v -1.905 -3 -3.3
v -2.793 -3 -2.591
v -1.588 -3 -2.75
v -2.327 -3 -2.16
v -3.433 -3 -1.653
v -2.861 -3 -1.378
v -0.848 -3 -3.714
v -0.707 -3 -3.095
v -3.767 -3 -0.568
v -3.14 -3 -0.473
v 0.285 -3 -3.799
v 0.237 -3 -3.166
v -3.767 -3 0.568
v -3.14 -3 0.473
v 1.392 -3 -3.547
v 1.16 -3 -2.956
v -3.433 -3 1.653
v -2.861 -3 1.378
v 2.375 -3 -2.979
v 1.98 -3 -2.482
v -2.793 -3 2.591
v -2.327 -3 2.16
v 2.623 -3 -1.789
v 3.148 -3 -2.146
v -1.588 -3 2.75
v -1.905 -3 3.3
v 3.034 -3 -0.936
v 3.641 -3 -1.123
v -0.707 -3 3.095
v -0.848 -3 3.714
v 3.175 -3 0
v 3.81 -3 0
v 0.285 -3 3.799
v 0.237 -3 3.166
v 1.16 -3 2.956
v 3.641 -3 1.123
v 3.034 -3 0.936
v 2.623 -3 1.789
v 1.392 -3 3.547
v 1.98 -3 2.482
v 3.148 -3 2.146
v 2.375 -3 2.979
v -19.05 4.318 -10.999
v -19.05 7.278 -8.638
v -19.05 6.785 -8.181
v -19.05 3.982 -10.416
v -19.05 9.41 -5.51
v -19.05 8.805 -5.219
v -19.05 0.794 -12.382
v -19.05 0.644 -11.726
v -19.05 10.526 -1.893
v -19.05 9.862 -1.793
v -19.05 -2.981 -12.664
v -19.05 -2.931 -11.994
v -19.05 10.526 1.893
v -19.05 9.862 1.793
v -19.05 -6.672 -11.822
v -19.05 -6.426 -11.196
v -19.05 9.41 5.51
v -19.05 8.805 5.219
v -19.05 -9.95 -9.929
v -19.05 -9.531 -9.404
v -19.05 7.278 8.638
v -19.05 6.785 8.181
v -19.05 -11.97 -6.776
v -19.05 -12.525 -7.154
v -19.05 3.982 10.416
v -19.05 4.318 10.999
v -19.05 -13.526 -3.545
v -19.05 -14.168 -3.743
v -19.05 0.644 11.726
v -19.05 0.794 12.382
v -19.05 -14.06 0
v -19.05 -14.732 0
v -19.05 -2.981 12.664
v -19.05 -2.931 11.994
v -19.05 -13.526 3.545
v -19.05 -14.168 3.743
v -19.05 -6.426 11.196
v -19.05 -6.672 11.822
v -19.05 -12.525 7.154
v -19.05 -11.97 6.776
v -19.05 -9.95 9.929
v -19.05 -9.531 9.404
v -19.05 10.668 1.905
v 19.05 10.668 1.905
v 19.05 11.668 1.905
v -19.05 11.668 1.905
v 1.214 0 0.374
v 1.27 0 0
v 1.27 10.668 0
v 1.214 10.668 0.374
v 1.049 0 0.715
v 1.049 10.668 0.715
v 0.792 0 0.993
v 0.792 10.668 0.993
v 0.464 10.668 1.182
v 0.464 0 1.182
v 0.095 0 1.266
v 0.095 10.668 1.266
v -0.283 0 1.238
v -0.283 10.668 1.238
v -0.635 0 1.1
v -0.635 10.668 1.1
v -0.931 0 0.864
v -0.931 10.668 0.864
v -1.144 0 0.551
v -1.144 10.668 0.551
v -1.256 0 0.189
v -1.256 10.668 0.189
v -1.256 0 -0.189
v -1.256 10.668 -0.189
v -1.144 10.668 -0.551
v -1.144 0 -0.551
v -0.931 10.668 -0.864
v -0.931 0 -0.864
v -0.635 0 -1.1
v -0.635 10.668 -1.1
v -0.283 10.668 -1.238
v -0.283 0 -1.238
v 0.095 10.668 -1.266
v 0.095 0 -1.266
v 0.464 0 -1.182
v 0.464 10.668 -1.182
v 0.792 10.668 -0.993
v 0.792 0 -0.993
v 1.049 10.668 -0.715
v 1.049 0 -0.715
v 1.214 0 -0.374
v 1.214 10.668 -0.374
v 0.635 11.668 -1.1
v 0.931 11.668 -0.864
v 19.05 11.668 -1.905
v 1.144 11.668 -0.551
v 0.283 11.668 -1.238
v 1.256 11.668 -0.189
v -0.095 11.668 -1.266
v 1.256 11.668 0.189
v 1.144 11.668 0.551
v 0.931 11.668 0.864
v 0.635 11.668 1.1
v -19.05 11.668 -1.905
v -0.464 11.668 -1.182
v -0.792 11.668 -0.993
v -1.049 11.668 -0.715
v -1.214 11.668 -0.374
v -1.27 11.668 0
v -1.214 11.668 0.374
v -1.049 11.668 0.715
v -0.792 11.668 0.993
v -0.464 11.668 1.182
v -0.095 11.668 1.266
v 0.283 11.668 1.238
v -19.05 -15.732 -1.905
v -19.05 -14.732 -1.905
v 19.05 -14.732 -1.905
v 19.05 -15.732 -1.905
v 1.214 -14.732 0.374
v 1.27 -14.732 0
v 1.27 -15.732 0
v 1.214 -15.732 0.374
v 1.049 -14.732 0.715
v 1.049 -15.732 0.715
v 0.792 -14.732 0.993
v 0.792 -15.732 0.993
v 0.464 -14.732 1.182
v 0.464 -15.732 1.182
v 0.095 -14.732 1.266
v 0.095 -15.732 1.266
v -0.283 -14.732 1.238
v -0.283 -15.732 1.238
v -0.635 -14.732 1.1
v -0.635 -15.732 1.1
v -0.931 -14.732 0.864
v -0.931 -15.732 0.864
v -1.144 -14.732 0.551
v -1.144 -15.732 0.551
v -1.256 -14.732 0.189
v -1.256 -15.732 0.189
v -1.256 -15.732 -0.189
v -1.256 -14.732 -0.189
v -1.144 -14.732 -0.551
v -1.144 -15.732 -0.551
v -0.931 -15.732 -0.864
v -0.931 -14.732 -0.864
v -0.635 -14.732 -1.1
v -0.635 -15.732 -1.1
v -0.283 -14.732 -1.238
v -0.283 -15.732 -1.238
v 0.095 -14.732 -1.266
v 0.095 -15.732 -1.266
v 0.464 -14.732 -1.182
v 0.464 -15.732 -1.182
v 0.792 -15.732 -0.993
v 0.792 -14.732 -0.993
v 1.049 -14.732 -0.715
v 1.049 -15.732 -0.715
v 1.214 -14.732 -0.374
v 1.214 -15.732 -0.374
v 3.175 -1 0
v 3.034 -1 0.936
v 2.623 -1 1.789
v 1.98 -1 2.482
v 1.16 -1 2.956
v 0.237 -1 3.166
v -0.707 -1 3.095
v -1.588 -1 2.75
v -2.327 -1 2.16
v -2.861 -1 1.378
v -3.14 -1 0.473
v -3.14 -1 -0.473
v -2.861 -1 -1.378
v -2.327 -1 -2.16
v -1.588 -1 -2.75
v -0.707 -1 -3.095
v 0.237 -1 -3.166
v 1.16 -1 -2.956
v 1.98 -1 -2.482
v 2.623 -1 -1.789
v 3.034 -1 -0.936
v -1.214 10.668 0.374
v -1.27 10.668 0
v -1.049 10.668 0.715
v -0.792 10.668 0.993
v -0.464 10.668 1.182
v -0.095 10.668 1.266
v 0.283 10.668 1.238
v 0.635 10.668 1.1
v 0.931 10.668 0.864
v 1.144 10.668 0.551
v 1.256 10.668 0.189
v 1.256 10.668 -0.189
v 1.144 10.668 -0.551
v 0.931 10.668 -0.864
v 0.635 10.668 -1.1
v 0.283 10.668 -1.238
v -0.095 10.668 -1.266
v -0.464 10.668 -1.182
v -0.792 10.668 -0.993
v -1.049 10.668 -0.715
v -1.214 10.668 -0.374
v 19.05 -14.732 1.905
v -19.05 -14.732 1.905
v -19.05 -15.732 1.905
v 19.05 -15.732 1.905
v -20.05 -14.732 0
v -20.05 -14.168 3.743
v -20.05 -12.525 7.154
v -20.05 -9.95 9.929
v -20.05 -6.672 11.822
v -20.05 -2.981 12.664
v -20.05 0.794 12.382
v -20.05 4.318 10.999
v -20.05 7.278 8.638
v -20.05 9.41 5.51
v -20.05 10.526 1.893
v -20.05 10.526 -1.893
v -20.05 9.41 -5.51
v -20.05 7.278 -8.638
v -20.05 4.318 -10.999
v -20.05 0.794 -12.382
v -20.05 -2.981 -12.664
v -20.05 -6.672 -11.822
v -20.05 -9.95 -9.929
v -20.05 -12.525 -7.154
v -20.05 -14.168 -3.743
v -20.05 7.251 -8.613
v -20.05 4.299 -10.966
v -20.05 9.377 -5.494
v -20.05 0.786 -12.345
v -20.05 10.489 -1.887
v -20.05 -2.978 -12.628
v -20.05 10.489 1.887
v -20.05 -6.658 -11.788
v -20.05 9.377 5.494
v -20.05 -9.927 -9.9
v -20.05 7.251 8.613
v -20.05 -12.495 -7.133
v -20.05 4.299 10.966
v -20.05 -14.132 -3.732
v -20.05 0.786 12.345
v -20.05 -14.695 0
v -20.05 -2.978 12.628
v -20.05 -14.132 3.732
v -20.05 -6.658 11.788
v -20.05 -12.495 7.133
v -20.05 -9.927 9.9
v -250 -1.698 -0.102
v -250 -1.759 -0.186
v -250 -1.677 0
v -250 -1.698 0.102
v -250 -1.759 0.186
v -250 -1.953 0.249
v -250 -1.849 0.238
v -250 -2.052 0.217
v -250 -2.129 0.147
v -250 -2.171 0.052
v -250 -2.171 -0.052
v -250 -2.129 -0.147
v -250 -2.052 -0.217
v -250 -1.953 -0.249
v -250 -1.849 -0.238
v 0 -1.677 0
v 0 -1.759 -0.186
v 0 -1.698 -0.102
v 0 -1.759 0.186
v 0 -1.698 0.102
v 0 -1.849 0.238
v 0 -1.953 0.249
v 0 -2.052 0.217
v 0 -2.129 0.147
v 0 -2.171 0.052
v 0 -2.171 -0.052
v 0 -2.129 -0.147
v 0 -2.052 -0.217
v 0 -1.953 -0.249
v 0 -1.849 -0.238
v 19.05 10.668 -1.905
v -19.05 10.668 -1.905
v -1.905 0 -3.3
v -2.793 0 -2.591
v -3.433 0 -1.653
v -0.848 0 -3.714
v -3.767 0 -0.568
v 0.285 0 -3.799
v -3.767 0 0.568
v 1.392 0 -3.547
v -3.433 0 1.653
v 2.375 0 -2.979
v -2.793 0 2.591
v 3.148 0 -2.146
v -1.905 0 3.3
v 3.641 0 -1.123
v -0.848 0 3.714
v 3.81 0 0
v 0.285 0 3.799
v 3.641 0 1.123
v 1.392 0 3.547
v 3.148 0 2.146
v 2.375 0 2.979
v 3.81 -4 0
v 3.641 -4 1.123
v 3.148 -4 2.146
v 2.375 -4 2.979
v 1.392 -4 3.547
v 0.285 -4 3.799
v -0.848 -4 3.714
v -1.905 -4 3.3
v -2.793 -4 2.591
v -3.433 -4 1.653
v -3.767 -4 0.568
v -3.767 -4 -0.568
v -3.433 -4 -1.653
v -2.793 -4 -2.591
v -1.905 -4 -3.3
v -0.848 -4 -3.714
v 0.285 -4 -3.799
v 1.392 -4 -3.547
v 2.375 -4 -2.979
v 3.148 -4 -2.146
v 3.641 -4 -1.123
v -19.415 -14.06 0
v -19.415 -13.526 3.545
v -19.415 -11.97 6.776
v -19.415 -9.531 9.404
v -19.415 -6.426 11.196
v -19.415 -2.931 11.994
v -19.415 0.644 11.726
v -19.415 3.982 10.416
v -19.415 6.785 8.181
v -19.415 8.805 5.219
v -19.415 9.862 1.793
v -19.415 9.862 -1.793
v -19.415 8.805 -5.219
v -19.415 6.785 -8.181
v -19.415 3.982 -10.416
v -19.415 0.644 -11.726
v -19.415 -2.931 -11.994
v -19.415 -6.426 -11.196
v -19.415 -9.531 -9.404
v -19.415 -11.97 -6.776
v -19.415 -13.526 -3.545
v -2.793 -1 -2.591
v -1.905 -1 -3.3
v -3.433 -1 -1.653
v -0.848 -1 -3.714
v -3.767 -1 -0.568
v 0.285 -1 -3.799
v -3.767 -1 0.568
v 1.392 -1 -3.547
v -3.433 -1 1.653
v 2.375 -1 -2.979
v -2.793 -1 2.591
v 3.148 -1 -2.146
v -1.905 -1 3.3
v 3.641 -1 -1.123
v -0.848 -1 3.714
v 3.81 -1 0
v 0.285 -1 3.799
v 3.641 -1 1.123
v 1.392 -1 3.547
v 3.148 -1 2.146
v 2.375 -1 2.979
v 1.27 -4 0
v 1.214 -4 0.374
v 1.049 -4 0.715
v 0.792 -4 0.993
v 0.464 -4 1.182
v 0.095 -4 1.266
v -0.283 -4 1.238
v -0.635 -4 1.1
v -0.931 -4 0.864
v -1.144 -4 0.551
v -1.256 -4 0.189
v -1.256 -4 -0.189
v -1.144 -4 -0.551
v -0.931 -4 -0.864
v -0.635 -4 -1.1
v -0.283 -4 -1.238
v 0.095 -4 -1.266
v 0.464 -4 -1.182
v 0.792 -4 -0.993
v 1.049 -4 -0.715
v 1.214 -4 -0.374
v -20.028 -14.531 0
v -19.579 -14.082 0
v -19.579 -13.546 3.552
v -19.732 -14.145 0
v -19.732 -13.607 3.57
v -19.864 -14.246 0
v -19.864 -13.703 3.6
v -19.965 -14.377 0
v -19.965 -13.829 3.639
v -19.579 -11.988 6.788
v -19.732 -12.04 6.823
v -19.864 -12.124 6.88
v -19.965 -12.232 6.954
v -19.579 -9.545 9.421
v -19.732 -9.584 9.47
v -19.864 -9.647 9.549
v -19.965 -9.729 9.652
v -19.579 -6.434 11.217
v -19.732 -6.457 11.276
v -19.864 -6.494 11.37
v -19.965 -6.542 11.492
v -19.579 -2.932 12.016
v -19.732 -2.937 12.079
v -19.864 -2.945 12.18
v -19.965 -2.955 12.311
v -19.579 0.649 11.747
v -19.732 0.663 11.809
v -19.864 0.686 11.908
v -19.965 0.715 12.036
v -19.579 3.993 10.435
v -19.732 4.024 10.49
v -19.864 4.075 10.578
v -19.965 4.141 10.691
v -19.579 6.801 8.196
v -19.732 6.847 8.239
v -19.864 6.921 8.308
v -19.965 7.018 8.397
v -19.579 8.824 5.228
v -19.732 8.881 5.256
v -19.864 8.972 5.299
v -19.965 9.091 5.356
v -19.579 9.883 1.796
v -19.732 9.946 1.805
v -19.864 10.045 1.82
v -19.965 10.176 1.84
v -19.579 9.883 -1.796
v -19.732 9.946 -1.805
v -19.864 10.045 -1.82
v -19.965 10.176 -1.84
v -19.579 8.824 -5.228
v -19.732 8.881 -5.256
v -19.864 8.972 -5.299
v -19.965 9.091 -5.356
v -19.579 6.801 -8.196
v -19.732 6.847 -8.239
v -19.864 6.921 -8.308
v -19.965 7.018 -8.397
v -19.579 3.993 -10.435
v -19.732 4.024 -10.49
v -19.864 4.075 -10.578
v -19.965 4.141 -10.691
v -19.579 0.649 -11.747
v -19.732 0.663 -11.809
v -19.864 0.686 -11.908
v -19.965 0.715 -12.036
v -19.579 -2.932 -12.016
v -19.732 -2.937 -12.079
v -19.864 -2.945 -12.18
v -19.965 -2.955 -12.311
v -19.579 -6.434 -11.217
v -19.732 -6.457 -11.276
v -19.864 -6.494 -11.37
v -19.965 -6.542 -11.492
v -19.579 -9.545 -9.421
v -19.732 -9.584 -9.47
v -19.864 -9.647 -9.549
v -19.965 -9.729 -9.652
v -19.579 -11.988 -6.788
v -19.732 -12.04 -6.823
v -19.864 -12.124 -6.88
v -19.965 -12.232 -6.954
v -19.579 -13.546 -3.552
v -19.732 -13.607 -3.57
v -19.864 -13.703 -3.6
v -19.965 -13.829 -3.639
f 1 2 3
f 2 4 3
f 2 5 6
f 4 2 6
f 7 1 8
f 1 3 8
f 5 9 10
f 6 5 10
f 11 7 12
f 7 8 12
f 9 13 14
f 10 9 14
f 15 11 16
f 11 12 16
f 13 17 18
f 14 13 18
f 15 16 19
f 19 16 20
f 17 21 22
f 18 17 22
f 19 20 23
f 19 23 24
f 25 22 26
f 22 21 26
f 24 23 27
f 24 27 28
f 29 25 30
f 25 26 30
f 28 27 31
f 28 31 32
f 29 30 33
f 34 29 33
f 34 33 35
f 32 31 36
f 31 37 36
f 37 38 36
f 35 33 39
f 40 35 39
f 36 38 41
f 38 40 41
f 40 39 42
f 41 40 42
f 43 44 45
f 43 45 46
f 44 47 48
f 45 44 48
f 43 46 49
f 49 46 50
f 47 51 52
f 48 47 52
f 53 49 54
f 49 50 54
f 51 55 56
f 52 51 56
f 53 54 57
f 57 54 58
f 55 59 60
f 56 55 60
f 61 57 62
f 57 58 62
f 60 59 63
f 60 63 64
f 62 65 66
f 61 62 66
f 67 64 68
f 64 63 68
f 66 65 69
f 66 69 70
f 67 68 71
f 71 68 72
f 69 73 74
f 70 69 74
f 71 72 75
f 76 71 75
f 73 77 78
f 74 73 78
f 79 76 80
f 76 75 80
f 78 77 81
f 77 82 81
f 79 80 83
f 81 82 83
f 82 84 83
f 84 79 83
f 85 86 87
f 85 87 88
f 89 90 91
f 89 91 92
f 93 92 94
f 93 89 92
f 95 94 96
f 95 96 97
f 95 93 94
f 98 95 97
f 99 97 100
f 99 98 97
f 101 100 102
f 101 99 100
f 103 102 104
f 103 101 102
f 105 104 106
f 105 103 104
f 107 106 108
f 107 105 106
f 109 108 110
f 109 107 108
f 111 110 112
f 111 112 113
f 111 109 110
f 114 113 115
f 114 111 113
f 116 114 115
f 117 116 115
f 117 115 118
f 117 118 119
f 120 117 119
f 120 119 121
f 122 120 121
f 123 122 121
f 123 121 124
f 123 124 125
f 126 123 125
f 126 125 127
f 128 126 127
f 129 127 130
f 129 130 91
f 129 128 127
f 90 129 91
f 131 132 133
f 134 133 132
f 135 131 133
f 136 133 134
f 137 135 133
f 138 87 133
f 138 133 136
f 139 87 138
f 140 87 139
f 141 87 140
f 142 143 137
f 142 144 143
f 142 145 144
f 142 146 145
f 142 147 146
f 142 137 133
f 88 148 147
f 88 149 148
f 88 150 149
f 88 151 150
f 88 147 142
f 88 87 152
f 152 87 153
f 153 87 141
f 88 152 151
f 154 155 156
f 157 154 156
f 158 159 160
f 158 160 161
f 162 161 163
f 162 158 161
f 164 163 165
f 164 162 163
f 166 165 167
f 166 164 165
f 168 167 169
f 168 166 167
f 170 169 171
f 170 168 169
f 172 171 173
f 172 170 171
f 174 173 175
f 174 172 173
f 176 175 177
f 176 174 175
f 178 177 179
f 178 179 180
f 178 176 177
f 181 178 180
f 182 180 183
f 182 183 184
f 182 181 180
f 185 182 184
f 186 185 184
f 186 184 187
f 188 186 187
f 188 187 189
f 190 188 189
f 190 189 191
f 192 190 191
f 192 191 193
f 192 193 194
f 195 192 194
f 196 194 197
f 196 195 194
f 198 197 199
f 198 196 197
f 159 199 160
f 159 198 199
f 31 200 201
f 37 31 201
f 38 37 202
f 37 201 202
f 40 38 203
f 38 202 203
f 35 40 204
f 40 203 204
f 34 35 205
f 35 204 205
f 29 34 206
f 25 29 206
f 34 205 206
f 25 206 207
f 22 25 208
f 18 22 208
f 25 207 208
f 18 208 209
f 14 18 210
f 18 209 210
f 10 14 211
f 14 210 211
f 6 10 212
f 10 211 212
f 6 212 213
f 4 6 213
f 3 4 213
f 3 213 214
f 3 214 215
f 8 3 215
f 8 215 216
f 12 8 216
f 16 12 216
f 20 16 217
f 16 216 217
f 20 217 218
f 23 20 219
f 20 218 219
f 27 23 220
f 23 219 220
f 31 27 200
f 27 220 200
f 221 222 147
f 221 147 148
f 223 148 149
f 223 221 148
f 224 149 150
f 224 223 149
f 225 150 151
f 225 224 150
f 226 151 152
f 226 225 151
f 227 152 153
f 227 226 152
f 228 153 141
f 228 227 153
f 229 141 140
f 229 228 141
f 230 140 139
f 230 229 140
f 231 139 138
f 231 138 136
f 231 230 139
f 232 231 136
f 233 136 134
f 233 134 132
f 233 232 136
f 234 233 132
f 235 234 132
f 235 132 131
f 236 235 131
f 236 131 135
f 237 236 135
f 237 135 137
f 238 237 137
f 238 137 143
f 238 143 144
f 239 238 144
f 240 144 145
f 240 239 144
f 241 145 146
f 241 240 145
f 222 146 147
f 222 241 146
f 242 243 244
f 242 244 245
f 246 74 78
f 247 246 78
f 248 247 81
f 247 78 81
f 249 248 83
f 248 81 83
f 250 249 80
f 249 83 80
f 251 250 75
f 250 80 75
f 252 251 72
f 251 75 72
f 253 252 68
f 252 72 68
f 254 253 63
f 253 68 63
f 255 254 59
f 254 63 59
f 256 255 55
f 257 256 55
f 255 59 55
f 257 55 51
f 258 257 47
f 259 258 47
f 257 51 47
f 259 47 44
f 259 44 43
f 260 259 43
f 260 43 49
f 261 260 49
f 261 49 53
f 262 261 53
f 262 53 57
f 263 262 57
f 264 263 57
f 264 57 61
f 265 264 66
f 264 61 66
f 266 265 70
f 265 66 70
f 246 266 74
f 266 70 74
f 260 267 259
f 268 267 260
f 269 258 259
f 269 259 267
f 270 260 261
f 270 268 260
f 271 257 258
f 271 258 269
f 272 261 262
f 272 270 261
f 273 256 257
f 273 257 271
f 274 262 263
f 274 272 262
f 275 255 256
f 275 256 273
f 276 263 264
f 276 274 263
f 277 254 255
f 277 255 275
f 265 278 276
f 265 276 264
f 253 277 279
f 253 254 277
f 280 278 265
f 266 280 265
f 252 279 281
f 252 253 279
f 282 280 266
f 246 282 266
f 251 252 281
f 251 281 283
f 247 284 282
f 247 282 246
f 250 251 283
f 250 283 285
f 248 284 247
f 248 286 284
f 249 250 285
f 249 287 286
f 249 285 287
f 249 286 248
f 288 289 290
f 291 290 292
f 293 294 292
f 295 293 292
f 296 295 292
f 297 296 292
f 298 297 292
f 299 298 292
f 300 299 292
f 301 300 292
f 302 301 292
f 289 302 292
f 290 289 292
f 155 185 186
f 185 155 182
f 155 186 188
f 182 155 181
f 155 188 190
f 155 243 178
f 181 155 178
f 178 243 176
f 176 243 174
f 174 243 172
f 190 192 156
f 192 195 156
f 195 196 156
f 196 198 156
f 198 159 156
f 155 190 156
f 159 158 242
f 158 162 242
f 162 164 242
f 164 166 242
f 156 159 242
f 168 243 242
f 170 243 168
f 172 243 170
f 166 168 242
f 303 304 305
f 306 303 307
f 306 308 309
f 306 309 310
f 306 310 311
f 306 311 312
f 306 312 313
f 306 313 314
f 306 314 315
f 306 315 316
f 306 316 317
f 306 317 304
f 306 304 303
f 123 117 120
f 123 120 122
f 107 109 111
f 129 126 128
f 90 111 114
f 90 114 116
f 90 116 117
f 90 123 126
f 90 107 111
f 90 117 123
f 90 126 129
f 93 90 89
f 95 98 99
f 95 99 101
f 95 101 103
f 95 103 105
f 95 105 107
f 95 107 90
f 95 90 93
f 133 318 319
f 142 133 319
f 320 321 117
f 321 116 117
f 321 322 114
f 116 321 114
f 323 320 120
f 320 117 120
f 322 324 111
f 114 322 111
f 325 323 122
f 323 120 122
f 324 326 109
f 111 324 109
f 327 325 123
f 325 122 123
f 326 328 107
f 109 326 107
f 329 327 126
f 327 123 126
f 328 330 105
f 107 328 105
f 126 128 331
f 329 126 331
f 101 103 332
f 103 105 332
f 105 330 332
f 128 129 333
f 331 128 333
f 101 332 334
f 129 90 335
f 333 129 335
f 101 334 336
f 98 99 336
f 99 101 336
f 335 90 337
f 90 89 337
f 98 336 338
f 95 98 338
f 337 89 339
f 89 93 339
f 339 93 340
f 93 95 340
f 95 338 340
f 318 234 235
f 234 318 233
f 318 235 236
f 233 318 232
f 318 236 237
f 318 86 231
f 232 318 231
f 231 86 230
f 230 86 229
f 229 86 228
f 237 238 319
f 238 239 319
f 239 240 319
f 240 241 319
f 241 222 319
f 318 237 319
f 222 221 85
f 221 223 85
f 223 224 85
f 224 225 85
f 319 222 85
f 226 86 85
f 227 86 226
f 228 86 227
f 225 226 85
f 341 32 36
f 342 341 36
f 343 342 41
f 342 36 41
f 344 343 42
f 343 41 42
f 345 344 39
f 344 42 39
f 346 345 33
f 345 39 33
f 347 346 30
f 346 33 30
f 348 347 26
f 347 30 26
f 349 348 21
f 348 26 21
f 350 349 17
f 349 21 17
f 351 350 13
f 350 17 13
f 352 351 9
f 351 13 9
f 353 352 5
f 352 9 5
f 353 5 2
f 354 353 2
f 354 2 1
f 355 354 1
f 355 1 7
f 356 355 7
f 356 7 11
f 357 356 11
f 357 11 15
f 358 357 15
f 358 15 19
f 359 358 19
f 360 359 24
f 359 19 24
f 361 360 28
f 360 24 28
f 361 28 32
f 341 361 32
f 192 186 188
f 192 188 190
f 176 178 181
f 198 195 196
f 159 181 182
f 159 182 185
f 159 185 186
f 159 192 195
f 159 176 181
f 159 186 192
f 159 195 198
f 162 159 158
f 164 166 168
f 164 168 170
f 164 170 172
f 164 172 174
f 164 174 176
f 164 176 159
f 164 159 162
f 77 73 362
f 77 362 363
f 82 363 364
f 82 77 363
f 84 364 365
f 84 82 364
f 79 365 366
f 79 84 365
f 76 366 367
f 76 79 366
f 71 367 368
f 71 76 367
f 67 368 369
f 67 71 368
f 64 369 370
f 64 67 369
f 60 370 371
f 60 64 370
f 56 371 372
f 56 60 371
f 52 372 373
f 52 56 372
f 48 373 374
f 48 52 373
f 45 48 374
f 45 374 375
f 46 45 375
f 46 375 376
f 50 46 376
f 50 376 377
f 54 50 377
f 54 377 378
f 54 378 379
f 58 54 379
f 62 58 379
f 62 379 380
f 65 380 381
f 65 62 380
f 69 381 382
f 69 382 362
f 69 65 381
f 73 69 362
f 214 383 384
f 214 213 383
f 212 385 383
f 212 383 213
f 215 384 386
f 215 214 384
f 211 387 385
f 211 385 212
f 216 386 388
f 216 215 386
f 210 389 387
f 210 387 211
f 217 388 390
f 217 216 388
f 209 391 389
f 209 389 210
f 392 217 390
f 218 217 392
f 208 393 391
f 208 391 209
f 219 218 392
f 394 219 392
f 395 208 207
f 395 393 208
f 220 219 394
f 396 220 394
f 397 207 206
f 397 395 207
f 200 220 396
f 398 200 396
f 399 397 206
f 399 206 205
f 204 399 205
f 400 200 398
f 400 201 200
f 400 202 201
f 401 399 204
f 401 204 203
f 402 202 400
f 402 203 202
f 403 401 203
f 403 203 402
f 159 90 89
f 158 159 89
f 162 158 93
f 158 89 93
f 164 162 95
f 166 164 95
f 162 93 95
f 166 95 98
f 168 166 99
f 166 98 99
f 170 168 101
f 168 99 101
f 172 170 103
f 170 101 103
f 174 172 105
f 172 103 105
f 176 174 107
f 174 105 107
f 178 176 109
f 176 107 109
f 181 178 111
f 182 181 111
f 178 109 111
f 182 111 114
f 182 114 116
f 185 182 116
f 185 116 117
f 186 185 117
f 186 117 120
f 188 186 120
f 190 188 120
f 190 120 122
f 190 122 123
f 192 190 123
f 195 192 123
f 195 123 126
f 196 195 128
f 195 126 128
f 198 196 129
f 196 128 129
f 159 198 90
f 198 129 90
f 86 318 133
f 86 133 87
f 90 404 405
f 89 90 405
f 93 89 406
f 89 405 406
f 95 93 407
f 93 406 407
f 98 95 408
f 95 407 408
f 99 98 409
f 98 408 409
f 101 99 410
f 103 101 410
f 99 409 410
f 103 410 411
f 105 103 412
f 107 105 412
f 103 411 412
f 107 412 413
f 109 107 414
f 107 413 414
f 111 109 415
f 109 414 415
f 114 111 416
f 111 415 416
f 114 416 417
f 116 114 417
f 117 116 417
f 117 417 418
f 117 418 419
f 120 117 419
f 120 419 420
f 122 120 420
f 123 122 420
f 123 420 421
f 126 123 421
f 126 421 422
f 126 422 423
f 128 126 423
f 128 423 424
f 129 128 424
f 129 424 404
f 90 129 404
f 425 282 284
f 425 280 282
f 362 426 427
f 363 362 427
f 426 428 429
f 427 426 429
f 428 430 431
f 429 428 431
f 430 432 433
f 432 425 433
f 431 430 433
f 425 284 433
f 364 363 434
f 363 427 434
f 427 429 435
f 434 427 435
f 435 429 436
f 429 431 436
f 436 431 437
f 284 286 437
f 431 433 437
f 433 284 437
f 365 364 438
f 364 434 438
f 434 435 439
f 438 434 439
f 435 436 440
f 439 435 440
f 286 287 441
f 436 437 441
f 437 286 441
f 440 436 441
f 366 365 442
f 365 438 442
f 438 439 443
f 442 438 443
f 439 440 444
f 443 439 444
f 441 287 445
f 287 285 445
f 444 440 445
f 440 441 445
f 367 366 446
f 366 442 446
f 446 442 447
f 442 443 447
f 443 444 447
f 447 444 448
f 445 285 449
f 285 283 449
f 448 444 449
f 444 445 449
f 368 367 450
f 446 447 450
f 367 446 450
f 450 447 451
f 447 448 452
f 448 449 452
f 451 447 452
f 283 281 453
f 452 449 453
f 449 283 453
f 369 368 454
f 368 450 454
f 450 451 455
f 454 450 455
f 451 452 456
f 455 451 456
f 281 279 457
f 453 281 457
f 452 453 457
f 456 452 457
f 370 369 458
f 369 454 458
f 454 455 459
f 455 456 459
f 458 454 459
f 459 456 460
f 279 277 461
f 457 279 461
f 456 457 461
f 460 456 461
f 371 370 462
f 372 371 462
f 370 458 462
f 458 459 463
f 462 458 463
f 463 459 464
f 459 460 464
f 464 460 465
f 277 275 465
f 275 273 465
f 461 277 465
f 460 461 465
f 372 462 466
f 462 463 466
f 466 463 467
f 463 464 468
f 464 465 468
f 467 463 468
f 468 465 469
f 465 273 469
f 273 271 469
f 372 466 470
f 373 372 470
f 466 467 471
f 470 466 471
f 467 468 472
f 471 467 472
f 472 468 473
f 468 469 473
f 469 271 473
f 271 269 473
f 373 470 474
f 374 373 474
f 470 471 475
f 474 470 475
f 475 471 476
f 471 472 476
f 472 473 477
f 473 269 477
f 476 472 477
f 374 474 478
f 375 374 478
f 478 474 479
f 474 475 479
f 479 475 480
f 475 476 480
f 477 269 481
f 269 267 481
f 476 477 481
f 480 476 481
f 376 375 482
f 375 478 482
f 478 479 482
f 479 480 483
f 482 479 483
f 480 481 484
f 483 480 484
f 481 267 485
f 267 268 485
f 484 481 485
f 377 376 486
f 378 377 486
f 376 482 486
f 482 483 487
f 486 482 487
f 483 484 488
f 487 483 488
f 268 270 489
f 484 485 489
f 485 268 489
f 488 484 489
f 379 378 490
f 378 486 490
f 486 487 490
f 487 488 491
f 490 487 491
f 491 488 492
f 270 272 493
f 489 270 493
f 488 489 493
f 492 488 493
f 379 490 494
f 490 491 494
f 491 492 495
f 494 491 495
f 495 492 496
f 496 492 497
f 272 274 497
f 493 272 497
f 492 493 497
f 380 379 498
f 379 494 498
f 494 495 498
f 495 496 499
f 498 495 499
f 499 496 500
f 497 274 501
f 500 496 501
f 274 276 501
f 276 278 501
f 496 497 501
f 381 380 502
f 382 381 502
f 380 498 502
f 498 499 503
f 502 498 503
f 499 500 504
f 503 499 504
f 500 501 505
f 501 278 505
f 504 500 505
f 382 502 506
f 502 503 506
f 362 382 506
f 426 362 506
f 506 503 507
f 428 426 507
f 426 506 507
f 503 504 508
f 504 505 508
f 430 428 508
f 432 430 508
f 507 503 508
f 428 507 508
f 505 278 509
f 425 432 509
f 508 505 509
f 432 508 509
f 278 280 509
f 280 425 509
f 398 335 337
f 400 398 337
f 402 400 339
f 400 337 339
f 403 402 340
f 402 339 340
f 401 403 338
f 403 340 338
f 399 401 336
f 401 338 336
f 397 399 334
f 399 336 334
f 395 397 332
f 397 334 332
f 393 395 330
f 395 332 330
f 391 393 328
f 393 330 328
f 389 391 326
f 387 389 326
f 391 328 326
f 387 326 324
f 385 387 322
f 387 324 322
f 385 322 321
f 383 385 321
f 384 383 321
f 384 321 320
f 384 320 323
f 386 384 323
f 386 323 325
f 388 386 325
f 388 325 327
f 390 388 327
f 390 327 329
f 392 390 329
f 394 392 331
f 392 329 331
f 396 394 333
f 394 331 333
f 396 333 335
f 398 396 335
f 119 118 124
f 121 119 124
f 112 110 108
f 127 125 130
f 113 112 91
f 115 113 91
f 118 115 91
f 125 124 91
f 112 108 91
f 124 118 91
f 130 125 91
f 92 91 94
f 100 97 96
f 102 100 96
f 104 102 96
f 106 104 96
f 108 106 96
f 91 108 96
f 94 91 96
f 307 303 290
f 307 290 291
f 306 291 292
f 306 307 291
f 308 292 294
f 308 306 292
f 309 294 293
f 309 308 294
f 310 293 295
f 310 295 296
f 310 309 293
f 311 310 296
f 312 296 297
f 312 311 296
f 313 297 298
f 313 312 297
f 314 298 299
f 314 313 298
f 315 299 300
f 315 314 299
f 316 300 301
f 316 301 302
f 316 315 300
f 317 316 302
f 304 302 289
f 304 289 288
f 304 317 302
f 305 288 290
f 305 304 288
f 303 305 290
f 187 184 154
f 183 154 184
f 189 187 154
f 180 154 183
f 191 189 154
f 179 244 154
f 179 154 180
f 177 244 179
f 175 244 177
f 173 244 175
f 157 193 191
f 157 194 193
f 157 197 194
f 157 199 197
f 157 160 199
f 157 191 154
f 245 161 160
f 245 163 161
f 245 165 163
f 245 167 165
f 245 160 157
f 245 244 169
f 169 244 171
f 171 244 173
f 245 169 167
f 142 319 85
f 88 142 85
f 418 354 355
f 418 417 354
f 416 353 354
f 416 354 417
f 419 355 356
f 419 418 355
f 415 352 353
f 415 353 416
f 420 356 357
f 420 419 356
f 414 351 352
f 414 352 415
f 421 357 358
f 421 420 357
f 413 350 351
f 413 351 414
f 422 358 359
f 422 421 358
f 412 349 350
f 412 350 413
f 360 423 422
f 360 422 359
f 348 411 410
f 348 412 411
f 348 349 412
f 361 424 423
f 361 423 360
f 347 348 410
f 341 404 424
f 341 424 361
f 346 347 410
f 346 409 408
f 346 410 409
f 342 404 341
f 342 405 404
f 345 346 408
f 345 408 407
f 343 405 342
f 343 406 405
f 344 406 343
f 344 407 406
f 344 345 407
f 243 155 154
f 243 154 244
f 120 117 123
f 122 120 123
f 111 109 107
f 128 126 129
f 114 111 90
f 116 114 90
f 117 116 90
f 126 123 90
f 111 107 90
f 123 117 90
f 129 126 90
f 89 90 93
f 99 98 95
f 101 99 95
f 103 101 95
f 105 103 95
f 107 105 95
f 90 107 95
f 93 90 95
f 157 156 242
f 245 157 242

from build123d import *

# Parameters (mm, degrees)
F0_R      = 3.81
F0_R_2    = 3.175
F1_DEPTH  = 1
F2_R      = 3.175
F3_DEPTH  = 2
F4_R      = 3.81
F4_R_2    = 3.175
F5_DEPTH  = 1
F6_R      = 1.27
F7_DEPTH  = 25.4
F8_R      = 1.27
F9_DEPTH  = 10.668
F10_DEPTH = 14.732
F11_W     = 38.1
F11_H     = 3.81
F11_R     = 1.27
F12_DEPTH = 1
F13_W     = 38.1
F13_H     = 3.81
F13_R     = 1.27
F14_DEPTH = 1
F15_R     = 12.0279233686
F16_DEPTH = 1
F17_R     = 0.635
F18_R     = 0.25
F19_DEPTH = 250


with BuildPart() as f1:
    # F0 (on Front) → F1 (new body)
    with BuildSketch(Plane.XZ):
        Circle(F0_R)
        Circle(F0_R_2, mode=Mode.SUBTRACT)
        Circle(F0_R_2)
    extrude(amount=F1_DEPTH)

    # F2 (on face) → F3 (join)
    with BuildSketch(Plane.XZ.offset(1)):
        Circle(F2_R)
    extrude(amount=F3_DEPTH)

    # F4 (on face) → F5 (join)
    with BuildSketch(Plane.XZ.offset(3)):
        Circle(F4_R)
        Circle(F4_R_2, mode=Mode.SUBTRACT)
        Circle(F4_R_2)
    extrude(amount=F5_DEPTH)

    # F6 (on face) → F7 (cut)
    with BuildSketch(Plane.XZ.offset(4)):
        Circle(F6_R)
    extrude(amount=-F7_DEPTH, mode=Mode.SUBTRACT)


with BuildPart() as f9:
    # F8 (on Front) → F9 (new body)
    with BuildSketch(Plane.XZ):
        Circle(F8_R)
    extrude(amount=-F9_DEPTH)


with BuildPart() as f10:
    # F10 (new): a face of the model
    f10_faces = [f9.part.faces().sort_by_distance(p)[0] for p in [
        (0, 0, 0),
    ]]
    extrude(f10_faces, amount=F10_DEPTH)


with BuildPart() as f12:
    # F11 (on face) → F12 (new body)
    with BuildSketch(Plane.XZ.offset(14.732)):
        Rectangle(F11_W, F11_H)
        Circle(F11_R, mode=Mode.SUBTRACT)
    extrude(amount=F12_DEPTH)


with BuildPart() as f14:
    # F13 (on face) → F14 (new body)
    with BuildSketch(Plane(origin=(0, 10.668, 0), x_dir=(-1, 0, 0), z_dir=(0, 1, 0))):
        Rectangle(F13_W, F13_H)
        Circle(F13_R, mode=Mode.SUBTRACT)
    extrude(amount=F14_DEPTH)


with BuildPart() as f16:
    # F15 (on face) → F16 (new body)
    with BuildSketch(Plane(origin=(-19.05, 0, 0), x_dir=(0, -1, 0), z_dir=(-1, 0, 0))):
        with BuildLine():
            ThreePointArc((-10.668, 8.8e-09), (2.0319999956, -12.7), (14.732, 0))
            ThreePointArc((14.732, 0), (2.0320000044, 12.7), (-10.668, 8.8e-09))
        make_face()
        with Locations((2.032, 0)):
            Circle(F15_R, mode=Mode.SUBTRACT)
    extrude(amount=F16_DEPTH)

    # F17
    f17_edges = [f16.edges().sort_by_distance(p)[0] for p in [
        (-20.05, 9.995923, 0),
    ]]
    fillet(f17_edges, radius=F17_R)


with BuildPart() as f19:
    # F18 (on Right) → F19 (new body)
    with BuildSketch(Plane.YZ):
        with Locations((-1.9265172215, 0)):
            Circle(F18_R)
    extrude(amount=-F19_DEPTH)


solid = Compound([f1.part, f9.part, f10.part, f12.part, f14.part, f16.part, f19.part])
